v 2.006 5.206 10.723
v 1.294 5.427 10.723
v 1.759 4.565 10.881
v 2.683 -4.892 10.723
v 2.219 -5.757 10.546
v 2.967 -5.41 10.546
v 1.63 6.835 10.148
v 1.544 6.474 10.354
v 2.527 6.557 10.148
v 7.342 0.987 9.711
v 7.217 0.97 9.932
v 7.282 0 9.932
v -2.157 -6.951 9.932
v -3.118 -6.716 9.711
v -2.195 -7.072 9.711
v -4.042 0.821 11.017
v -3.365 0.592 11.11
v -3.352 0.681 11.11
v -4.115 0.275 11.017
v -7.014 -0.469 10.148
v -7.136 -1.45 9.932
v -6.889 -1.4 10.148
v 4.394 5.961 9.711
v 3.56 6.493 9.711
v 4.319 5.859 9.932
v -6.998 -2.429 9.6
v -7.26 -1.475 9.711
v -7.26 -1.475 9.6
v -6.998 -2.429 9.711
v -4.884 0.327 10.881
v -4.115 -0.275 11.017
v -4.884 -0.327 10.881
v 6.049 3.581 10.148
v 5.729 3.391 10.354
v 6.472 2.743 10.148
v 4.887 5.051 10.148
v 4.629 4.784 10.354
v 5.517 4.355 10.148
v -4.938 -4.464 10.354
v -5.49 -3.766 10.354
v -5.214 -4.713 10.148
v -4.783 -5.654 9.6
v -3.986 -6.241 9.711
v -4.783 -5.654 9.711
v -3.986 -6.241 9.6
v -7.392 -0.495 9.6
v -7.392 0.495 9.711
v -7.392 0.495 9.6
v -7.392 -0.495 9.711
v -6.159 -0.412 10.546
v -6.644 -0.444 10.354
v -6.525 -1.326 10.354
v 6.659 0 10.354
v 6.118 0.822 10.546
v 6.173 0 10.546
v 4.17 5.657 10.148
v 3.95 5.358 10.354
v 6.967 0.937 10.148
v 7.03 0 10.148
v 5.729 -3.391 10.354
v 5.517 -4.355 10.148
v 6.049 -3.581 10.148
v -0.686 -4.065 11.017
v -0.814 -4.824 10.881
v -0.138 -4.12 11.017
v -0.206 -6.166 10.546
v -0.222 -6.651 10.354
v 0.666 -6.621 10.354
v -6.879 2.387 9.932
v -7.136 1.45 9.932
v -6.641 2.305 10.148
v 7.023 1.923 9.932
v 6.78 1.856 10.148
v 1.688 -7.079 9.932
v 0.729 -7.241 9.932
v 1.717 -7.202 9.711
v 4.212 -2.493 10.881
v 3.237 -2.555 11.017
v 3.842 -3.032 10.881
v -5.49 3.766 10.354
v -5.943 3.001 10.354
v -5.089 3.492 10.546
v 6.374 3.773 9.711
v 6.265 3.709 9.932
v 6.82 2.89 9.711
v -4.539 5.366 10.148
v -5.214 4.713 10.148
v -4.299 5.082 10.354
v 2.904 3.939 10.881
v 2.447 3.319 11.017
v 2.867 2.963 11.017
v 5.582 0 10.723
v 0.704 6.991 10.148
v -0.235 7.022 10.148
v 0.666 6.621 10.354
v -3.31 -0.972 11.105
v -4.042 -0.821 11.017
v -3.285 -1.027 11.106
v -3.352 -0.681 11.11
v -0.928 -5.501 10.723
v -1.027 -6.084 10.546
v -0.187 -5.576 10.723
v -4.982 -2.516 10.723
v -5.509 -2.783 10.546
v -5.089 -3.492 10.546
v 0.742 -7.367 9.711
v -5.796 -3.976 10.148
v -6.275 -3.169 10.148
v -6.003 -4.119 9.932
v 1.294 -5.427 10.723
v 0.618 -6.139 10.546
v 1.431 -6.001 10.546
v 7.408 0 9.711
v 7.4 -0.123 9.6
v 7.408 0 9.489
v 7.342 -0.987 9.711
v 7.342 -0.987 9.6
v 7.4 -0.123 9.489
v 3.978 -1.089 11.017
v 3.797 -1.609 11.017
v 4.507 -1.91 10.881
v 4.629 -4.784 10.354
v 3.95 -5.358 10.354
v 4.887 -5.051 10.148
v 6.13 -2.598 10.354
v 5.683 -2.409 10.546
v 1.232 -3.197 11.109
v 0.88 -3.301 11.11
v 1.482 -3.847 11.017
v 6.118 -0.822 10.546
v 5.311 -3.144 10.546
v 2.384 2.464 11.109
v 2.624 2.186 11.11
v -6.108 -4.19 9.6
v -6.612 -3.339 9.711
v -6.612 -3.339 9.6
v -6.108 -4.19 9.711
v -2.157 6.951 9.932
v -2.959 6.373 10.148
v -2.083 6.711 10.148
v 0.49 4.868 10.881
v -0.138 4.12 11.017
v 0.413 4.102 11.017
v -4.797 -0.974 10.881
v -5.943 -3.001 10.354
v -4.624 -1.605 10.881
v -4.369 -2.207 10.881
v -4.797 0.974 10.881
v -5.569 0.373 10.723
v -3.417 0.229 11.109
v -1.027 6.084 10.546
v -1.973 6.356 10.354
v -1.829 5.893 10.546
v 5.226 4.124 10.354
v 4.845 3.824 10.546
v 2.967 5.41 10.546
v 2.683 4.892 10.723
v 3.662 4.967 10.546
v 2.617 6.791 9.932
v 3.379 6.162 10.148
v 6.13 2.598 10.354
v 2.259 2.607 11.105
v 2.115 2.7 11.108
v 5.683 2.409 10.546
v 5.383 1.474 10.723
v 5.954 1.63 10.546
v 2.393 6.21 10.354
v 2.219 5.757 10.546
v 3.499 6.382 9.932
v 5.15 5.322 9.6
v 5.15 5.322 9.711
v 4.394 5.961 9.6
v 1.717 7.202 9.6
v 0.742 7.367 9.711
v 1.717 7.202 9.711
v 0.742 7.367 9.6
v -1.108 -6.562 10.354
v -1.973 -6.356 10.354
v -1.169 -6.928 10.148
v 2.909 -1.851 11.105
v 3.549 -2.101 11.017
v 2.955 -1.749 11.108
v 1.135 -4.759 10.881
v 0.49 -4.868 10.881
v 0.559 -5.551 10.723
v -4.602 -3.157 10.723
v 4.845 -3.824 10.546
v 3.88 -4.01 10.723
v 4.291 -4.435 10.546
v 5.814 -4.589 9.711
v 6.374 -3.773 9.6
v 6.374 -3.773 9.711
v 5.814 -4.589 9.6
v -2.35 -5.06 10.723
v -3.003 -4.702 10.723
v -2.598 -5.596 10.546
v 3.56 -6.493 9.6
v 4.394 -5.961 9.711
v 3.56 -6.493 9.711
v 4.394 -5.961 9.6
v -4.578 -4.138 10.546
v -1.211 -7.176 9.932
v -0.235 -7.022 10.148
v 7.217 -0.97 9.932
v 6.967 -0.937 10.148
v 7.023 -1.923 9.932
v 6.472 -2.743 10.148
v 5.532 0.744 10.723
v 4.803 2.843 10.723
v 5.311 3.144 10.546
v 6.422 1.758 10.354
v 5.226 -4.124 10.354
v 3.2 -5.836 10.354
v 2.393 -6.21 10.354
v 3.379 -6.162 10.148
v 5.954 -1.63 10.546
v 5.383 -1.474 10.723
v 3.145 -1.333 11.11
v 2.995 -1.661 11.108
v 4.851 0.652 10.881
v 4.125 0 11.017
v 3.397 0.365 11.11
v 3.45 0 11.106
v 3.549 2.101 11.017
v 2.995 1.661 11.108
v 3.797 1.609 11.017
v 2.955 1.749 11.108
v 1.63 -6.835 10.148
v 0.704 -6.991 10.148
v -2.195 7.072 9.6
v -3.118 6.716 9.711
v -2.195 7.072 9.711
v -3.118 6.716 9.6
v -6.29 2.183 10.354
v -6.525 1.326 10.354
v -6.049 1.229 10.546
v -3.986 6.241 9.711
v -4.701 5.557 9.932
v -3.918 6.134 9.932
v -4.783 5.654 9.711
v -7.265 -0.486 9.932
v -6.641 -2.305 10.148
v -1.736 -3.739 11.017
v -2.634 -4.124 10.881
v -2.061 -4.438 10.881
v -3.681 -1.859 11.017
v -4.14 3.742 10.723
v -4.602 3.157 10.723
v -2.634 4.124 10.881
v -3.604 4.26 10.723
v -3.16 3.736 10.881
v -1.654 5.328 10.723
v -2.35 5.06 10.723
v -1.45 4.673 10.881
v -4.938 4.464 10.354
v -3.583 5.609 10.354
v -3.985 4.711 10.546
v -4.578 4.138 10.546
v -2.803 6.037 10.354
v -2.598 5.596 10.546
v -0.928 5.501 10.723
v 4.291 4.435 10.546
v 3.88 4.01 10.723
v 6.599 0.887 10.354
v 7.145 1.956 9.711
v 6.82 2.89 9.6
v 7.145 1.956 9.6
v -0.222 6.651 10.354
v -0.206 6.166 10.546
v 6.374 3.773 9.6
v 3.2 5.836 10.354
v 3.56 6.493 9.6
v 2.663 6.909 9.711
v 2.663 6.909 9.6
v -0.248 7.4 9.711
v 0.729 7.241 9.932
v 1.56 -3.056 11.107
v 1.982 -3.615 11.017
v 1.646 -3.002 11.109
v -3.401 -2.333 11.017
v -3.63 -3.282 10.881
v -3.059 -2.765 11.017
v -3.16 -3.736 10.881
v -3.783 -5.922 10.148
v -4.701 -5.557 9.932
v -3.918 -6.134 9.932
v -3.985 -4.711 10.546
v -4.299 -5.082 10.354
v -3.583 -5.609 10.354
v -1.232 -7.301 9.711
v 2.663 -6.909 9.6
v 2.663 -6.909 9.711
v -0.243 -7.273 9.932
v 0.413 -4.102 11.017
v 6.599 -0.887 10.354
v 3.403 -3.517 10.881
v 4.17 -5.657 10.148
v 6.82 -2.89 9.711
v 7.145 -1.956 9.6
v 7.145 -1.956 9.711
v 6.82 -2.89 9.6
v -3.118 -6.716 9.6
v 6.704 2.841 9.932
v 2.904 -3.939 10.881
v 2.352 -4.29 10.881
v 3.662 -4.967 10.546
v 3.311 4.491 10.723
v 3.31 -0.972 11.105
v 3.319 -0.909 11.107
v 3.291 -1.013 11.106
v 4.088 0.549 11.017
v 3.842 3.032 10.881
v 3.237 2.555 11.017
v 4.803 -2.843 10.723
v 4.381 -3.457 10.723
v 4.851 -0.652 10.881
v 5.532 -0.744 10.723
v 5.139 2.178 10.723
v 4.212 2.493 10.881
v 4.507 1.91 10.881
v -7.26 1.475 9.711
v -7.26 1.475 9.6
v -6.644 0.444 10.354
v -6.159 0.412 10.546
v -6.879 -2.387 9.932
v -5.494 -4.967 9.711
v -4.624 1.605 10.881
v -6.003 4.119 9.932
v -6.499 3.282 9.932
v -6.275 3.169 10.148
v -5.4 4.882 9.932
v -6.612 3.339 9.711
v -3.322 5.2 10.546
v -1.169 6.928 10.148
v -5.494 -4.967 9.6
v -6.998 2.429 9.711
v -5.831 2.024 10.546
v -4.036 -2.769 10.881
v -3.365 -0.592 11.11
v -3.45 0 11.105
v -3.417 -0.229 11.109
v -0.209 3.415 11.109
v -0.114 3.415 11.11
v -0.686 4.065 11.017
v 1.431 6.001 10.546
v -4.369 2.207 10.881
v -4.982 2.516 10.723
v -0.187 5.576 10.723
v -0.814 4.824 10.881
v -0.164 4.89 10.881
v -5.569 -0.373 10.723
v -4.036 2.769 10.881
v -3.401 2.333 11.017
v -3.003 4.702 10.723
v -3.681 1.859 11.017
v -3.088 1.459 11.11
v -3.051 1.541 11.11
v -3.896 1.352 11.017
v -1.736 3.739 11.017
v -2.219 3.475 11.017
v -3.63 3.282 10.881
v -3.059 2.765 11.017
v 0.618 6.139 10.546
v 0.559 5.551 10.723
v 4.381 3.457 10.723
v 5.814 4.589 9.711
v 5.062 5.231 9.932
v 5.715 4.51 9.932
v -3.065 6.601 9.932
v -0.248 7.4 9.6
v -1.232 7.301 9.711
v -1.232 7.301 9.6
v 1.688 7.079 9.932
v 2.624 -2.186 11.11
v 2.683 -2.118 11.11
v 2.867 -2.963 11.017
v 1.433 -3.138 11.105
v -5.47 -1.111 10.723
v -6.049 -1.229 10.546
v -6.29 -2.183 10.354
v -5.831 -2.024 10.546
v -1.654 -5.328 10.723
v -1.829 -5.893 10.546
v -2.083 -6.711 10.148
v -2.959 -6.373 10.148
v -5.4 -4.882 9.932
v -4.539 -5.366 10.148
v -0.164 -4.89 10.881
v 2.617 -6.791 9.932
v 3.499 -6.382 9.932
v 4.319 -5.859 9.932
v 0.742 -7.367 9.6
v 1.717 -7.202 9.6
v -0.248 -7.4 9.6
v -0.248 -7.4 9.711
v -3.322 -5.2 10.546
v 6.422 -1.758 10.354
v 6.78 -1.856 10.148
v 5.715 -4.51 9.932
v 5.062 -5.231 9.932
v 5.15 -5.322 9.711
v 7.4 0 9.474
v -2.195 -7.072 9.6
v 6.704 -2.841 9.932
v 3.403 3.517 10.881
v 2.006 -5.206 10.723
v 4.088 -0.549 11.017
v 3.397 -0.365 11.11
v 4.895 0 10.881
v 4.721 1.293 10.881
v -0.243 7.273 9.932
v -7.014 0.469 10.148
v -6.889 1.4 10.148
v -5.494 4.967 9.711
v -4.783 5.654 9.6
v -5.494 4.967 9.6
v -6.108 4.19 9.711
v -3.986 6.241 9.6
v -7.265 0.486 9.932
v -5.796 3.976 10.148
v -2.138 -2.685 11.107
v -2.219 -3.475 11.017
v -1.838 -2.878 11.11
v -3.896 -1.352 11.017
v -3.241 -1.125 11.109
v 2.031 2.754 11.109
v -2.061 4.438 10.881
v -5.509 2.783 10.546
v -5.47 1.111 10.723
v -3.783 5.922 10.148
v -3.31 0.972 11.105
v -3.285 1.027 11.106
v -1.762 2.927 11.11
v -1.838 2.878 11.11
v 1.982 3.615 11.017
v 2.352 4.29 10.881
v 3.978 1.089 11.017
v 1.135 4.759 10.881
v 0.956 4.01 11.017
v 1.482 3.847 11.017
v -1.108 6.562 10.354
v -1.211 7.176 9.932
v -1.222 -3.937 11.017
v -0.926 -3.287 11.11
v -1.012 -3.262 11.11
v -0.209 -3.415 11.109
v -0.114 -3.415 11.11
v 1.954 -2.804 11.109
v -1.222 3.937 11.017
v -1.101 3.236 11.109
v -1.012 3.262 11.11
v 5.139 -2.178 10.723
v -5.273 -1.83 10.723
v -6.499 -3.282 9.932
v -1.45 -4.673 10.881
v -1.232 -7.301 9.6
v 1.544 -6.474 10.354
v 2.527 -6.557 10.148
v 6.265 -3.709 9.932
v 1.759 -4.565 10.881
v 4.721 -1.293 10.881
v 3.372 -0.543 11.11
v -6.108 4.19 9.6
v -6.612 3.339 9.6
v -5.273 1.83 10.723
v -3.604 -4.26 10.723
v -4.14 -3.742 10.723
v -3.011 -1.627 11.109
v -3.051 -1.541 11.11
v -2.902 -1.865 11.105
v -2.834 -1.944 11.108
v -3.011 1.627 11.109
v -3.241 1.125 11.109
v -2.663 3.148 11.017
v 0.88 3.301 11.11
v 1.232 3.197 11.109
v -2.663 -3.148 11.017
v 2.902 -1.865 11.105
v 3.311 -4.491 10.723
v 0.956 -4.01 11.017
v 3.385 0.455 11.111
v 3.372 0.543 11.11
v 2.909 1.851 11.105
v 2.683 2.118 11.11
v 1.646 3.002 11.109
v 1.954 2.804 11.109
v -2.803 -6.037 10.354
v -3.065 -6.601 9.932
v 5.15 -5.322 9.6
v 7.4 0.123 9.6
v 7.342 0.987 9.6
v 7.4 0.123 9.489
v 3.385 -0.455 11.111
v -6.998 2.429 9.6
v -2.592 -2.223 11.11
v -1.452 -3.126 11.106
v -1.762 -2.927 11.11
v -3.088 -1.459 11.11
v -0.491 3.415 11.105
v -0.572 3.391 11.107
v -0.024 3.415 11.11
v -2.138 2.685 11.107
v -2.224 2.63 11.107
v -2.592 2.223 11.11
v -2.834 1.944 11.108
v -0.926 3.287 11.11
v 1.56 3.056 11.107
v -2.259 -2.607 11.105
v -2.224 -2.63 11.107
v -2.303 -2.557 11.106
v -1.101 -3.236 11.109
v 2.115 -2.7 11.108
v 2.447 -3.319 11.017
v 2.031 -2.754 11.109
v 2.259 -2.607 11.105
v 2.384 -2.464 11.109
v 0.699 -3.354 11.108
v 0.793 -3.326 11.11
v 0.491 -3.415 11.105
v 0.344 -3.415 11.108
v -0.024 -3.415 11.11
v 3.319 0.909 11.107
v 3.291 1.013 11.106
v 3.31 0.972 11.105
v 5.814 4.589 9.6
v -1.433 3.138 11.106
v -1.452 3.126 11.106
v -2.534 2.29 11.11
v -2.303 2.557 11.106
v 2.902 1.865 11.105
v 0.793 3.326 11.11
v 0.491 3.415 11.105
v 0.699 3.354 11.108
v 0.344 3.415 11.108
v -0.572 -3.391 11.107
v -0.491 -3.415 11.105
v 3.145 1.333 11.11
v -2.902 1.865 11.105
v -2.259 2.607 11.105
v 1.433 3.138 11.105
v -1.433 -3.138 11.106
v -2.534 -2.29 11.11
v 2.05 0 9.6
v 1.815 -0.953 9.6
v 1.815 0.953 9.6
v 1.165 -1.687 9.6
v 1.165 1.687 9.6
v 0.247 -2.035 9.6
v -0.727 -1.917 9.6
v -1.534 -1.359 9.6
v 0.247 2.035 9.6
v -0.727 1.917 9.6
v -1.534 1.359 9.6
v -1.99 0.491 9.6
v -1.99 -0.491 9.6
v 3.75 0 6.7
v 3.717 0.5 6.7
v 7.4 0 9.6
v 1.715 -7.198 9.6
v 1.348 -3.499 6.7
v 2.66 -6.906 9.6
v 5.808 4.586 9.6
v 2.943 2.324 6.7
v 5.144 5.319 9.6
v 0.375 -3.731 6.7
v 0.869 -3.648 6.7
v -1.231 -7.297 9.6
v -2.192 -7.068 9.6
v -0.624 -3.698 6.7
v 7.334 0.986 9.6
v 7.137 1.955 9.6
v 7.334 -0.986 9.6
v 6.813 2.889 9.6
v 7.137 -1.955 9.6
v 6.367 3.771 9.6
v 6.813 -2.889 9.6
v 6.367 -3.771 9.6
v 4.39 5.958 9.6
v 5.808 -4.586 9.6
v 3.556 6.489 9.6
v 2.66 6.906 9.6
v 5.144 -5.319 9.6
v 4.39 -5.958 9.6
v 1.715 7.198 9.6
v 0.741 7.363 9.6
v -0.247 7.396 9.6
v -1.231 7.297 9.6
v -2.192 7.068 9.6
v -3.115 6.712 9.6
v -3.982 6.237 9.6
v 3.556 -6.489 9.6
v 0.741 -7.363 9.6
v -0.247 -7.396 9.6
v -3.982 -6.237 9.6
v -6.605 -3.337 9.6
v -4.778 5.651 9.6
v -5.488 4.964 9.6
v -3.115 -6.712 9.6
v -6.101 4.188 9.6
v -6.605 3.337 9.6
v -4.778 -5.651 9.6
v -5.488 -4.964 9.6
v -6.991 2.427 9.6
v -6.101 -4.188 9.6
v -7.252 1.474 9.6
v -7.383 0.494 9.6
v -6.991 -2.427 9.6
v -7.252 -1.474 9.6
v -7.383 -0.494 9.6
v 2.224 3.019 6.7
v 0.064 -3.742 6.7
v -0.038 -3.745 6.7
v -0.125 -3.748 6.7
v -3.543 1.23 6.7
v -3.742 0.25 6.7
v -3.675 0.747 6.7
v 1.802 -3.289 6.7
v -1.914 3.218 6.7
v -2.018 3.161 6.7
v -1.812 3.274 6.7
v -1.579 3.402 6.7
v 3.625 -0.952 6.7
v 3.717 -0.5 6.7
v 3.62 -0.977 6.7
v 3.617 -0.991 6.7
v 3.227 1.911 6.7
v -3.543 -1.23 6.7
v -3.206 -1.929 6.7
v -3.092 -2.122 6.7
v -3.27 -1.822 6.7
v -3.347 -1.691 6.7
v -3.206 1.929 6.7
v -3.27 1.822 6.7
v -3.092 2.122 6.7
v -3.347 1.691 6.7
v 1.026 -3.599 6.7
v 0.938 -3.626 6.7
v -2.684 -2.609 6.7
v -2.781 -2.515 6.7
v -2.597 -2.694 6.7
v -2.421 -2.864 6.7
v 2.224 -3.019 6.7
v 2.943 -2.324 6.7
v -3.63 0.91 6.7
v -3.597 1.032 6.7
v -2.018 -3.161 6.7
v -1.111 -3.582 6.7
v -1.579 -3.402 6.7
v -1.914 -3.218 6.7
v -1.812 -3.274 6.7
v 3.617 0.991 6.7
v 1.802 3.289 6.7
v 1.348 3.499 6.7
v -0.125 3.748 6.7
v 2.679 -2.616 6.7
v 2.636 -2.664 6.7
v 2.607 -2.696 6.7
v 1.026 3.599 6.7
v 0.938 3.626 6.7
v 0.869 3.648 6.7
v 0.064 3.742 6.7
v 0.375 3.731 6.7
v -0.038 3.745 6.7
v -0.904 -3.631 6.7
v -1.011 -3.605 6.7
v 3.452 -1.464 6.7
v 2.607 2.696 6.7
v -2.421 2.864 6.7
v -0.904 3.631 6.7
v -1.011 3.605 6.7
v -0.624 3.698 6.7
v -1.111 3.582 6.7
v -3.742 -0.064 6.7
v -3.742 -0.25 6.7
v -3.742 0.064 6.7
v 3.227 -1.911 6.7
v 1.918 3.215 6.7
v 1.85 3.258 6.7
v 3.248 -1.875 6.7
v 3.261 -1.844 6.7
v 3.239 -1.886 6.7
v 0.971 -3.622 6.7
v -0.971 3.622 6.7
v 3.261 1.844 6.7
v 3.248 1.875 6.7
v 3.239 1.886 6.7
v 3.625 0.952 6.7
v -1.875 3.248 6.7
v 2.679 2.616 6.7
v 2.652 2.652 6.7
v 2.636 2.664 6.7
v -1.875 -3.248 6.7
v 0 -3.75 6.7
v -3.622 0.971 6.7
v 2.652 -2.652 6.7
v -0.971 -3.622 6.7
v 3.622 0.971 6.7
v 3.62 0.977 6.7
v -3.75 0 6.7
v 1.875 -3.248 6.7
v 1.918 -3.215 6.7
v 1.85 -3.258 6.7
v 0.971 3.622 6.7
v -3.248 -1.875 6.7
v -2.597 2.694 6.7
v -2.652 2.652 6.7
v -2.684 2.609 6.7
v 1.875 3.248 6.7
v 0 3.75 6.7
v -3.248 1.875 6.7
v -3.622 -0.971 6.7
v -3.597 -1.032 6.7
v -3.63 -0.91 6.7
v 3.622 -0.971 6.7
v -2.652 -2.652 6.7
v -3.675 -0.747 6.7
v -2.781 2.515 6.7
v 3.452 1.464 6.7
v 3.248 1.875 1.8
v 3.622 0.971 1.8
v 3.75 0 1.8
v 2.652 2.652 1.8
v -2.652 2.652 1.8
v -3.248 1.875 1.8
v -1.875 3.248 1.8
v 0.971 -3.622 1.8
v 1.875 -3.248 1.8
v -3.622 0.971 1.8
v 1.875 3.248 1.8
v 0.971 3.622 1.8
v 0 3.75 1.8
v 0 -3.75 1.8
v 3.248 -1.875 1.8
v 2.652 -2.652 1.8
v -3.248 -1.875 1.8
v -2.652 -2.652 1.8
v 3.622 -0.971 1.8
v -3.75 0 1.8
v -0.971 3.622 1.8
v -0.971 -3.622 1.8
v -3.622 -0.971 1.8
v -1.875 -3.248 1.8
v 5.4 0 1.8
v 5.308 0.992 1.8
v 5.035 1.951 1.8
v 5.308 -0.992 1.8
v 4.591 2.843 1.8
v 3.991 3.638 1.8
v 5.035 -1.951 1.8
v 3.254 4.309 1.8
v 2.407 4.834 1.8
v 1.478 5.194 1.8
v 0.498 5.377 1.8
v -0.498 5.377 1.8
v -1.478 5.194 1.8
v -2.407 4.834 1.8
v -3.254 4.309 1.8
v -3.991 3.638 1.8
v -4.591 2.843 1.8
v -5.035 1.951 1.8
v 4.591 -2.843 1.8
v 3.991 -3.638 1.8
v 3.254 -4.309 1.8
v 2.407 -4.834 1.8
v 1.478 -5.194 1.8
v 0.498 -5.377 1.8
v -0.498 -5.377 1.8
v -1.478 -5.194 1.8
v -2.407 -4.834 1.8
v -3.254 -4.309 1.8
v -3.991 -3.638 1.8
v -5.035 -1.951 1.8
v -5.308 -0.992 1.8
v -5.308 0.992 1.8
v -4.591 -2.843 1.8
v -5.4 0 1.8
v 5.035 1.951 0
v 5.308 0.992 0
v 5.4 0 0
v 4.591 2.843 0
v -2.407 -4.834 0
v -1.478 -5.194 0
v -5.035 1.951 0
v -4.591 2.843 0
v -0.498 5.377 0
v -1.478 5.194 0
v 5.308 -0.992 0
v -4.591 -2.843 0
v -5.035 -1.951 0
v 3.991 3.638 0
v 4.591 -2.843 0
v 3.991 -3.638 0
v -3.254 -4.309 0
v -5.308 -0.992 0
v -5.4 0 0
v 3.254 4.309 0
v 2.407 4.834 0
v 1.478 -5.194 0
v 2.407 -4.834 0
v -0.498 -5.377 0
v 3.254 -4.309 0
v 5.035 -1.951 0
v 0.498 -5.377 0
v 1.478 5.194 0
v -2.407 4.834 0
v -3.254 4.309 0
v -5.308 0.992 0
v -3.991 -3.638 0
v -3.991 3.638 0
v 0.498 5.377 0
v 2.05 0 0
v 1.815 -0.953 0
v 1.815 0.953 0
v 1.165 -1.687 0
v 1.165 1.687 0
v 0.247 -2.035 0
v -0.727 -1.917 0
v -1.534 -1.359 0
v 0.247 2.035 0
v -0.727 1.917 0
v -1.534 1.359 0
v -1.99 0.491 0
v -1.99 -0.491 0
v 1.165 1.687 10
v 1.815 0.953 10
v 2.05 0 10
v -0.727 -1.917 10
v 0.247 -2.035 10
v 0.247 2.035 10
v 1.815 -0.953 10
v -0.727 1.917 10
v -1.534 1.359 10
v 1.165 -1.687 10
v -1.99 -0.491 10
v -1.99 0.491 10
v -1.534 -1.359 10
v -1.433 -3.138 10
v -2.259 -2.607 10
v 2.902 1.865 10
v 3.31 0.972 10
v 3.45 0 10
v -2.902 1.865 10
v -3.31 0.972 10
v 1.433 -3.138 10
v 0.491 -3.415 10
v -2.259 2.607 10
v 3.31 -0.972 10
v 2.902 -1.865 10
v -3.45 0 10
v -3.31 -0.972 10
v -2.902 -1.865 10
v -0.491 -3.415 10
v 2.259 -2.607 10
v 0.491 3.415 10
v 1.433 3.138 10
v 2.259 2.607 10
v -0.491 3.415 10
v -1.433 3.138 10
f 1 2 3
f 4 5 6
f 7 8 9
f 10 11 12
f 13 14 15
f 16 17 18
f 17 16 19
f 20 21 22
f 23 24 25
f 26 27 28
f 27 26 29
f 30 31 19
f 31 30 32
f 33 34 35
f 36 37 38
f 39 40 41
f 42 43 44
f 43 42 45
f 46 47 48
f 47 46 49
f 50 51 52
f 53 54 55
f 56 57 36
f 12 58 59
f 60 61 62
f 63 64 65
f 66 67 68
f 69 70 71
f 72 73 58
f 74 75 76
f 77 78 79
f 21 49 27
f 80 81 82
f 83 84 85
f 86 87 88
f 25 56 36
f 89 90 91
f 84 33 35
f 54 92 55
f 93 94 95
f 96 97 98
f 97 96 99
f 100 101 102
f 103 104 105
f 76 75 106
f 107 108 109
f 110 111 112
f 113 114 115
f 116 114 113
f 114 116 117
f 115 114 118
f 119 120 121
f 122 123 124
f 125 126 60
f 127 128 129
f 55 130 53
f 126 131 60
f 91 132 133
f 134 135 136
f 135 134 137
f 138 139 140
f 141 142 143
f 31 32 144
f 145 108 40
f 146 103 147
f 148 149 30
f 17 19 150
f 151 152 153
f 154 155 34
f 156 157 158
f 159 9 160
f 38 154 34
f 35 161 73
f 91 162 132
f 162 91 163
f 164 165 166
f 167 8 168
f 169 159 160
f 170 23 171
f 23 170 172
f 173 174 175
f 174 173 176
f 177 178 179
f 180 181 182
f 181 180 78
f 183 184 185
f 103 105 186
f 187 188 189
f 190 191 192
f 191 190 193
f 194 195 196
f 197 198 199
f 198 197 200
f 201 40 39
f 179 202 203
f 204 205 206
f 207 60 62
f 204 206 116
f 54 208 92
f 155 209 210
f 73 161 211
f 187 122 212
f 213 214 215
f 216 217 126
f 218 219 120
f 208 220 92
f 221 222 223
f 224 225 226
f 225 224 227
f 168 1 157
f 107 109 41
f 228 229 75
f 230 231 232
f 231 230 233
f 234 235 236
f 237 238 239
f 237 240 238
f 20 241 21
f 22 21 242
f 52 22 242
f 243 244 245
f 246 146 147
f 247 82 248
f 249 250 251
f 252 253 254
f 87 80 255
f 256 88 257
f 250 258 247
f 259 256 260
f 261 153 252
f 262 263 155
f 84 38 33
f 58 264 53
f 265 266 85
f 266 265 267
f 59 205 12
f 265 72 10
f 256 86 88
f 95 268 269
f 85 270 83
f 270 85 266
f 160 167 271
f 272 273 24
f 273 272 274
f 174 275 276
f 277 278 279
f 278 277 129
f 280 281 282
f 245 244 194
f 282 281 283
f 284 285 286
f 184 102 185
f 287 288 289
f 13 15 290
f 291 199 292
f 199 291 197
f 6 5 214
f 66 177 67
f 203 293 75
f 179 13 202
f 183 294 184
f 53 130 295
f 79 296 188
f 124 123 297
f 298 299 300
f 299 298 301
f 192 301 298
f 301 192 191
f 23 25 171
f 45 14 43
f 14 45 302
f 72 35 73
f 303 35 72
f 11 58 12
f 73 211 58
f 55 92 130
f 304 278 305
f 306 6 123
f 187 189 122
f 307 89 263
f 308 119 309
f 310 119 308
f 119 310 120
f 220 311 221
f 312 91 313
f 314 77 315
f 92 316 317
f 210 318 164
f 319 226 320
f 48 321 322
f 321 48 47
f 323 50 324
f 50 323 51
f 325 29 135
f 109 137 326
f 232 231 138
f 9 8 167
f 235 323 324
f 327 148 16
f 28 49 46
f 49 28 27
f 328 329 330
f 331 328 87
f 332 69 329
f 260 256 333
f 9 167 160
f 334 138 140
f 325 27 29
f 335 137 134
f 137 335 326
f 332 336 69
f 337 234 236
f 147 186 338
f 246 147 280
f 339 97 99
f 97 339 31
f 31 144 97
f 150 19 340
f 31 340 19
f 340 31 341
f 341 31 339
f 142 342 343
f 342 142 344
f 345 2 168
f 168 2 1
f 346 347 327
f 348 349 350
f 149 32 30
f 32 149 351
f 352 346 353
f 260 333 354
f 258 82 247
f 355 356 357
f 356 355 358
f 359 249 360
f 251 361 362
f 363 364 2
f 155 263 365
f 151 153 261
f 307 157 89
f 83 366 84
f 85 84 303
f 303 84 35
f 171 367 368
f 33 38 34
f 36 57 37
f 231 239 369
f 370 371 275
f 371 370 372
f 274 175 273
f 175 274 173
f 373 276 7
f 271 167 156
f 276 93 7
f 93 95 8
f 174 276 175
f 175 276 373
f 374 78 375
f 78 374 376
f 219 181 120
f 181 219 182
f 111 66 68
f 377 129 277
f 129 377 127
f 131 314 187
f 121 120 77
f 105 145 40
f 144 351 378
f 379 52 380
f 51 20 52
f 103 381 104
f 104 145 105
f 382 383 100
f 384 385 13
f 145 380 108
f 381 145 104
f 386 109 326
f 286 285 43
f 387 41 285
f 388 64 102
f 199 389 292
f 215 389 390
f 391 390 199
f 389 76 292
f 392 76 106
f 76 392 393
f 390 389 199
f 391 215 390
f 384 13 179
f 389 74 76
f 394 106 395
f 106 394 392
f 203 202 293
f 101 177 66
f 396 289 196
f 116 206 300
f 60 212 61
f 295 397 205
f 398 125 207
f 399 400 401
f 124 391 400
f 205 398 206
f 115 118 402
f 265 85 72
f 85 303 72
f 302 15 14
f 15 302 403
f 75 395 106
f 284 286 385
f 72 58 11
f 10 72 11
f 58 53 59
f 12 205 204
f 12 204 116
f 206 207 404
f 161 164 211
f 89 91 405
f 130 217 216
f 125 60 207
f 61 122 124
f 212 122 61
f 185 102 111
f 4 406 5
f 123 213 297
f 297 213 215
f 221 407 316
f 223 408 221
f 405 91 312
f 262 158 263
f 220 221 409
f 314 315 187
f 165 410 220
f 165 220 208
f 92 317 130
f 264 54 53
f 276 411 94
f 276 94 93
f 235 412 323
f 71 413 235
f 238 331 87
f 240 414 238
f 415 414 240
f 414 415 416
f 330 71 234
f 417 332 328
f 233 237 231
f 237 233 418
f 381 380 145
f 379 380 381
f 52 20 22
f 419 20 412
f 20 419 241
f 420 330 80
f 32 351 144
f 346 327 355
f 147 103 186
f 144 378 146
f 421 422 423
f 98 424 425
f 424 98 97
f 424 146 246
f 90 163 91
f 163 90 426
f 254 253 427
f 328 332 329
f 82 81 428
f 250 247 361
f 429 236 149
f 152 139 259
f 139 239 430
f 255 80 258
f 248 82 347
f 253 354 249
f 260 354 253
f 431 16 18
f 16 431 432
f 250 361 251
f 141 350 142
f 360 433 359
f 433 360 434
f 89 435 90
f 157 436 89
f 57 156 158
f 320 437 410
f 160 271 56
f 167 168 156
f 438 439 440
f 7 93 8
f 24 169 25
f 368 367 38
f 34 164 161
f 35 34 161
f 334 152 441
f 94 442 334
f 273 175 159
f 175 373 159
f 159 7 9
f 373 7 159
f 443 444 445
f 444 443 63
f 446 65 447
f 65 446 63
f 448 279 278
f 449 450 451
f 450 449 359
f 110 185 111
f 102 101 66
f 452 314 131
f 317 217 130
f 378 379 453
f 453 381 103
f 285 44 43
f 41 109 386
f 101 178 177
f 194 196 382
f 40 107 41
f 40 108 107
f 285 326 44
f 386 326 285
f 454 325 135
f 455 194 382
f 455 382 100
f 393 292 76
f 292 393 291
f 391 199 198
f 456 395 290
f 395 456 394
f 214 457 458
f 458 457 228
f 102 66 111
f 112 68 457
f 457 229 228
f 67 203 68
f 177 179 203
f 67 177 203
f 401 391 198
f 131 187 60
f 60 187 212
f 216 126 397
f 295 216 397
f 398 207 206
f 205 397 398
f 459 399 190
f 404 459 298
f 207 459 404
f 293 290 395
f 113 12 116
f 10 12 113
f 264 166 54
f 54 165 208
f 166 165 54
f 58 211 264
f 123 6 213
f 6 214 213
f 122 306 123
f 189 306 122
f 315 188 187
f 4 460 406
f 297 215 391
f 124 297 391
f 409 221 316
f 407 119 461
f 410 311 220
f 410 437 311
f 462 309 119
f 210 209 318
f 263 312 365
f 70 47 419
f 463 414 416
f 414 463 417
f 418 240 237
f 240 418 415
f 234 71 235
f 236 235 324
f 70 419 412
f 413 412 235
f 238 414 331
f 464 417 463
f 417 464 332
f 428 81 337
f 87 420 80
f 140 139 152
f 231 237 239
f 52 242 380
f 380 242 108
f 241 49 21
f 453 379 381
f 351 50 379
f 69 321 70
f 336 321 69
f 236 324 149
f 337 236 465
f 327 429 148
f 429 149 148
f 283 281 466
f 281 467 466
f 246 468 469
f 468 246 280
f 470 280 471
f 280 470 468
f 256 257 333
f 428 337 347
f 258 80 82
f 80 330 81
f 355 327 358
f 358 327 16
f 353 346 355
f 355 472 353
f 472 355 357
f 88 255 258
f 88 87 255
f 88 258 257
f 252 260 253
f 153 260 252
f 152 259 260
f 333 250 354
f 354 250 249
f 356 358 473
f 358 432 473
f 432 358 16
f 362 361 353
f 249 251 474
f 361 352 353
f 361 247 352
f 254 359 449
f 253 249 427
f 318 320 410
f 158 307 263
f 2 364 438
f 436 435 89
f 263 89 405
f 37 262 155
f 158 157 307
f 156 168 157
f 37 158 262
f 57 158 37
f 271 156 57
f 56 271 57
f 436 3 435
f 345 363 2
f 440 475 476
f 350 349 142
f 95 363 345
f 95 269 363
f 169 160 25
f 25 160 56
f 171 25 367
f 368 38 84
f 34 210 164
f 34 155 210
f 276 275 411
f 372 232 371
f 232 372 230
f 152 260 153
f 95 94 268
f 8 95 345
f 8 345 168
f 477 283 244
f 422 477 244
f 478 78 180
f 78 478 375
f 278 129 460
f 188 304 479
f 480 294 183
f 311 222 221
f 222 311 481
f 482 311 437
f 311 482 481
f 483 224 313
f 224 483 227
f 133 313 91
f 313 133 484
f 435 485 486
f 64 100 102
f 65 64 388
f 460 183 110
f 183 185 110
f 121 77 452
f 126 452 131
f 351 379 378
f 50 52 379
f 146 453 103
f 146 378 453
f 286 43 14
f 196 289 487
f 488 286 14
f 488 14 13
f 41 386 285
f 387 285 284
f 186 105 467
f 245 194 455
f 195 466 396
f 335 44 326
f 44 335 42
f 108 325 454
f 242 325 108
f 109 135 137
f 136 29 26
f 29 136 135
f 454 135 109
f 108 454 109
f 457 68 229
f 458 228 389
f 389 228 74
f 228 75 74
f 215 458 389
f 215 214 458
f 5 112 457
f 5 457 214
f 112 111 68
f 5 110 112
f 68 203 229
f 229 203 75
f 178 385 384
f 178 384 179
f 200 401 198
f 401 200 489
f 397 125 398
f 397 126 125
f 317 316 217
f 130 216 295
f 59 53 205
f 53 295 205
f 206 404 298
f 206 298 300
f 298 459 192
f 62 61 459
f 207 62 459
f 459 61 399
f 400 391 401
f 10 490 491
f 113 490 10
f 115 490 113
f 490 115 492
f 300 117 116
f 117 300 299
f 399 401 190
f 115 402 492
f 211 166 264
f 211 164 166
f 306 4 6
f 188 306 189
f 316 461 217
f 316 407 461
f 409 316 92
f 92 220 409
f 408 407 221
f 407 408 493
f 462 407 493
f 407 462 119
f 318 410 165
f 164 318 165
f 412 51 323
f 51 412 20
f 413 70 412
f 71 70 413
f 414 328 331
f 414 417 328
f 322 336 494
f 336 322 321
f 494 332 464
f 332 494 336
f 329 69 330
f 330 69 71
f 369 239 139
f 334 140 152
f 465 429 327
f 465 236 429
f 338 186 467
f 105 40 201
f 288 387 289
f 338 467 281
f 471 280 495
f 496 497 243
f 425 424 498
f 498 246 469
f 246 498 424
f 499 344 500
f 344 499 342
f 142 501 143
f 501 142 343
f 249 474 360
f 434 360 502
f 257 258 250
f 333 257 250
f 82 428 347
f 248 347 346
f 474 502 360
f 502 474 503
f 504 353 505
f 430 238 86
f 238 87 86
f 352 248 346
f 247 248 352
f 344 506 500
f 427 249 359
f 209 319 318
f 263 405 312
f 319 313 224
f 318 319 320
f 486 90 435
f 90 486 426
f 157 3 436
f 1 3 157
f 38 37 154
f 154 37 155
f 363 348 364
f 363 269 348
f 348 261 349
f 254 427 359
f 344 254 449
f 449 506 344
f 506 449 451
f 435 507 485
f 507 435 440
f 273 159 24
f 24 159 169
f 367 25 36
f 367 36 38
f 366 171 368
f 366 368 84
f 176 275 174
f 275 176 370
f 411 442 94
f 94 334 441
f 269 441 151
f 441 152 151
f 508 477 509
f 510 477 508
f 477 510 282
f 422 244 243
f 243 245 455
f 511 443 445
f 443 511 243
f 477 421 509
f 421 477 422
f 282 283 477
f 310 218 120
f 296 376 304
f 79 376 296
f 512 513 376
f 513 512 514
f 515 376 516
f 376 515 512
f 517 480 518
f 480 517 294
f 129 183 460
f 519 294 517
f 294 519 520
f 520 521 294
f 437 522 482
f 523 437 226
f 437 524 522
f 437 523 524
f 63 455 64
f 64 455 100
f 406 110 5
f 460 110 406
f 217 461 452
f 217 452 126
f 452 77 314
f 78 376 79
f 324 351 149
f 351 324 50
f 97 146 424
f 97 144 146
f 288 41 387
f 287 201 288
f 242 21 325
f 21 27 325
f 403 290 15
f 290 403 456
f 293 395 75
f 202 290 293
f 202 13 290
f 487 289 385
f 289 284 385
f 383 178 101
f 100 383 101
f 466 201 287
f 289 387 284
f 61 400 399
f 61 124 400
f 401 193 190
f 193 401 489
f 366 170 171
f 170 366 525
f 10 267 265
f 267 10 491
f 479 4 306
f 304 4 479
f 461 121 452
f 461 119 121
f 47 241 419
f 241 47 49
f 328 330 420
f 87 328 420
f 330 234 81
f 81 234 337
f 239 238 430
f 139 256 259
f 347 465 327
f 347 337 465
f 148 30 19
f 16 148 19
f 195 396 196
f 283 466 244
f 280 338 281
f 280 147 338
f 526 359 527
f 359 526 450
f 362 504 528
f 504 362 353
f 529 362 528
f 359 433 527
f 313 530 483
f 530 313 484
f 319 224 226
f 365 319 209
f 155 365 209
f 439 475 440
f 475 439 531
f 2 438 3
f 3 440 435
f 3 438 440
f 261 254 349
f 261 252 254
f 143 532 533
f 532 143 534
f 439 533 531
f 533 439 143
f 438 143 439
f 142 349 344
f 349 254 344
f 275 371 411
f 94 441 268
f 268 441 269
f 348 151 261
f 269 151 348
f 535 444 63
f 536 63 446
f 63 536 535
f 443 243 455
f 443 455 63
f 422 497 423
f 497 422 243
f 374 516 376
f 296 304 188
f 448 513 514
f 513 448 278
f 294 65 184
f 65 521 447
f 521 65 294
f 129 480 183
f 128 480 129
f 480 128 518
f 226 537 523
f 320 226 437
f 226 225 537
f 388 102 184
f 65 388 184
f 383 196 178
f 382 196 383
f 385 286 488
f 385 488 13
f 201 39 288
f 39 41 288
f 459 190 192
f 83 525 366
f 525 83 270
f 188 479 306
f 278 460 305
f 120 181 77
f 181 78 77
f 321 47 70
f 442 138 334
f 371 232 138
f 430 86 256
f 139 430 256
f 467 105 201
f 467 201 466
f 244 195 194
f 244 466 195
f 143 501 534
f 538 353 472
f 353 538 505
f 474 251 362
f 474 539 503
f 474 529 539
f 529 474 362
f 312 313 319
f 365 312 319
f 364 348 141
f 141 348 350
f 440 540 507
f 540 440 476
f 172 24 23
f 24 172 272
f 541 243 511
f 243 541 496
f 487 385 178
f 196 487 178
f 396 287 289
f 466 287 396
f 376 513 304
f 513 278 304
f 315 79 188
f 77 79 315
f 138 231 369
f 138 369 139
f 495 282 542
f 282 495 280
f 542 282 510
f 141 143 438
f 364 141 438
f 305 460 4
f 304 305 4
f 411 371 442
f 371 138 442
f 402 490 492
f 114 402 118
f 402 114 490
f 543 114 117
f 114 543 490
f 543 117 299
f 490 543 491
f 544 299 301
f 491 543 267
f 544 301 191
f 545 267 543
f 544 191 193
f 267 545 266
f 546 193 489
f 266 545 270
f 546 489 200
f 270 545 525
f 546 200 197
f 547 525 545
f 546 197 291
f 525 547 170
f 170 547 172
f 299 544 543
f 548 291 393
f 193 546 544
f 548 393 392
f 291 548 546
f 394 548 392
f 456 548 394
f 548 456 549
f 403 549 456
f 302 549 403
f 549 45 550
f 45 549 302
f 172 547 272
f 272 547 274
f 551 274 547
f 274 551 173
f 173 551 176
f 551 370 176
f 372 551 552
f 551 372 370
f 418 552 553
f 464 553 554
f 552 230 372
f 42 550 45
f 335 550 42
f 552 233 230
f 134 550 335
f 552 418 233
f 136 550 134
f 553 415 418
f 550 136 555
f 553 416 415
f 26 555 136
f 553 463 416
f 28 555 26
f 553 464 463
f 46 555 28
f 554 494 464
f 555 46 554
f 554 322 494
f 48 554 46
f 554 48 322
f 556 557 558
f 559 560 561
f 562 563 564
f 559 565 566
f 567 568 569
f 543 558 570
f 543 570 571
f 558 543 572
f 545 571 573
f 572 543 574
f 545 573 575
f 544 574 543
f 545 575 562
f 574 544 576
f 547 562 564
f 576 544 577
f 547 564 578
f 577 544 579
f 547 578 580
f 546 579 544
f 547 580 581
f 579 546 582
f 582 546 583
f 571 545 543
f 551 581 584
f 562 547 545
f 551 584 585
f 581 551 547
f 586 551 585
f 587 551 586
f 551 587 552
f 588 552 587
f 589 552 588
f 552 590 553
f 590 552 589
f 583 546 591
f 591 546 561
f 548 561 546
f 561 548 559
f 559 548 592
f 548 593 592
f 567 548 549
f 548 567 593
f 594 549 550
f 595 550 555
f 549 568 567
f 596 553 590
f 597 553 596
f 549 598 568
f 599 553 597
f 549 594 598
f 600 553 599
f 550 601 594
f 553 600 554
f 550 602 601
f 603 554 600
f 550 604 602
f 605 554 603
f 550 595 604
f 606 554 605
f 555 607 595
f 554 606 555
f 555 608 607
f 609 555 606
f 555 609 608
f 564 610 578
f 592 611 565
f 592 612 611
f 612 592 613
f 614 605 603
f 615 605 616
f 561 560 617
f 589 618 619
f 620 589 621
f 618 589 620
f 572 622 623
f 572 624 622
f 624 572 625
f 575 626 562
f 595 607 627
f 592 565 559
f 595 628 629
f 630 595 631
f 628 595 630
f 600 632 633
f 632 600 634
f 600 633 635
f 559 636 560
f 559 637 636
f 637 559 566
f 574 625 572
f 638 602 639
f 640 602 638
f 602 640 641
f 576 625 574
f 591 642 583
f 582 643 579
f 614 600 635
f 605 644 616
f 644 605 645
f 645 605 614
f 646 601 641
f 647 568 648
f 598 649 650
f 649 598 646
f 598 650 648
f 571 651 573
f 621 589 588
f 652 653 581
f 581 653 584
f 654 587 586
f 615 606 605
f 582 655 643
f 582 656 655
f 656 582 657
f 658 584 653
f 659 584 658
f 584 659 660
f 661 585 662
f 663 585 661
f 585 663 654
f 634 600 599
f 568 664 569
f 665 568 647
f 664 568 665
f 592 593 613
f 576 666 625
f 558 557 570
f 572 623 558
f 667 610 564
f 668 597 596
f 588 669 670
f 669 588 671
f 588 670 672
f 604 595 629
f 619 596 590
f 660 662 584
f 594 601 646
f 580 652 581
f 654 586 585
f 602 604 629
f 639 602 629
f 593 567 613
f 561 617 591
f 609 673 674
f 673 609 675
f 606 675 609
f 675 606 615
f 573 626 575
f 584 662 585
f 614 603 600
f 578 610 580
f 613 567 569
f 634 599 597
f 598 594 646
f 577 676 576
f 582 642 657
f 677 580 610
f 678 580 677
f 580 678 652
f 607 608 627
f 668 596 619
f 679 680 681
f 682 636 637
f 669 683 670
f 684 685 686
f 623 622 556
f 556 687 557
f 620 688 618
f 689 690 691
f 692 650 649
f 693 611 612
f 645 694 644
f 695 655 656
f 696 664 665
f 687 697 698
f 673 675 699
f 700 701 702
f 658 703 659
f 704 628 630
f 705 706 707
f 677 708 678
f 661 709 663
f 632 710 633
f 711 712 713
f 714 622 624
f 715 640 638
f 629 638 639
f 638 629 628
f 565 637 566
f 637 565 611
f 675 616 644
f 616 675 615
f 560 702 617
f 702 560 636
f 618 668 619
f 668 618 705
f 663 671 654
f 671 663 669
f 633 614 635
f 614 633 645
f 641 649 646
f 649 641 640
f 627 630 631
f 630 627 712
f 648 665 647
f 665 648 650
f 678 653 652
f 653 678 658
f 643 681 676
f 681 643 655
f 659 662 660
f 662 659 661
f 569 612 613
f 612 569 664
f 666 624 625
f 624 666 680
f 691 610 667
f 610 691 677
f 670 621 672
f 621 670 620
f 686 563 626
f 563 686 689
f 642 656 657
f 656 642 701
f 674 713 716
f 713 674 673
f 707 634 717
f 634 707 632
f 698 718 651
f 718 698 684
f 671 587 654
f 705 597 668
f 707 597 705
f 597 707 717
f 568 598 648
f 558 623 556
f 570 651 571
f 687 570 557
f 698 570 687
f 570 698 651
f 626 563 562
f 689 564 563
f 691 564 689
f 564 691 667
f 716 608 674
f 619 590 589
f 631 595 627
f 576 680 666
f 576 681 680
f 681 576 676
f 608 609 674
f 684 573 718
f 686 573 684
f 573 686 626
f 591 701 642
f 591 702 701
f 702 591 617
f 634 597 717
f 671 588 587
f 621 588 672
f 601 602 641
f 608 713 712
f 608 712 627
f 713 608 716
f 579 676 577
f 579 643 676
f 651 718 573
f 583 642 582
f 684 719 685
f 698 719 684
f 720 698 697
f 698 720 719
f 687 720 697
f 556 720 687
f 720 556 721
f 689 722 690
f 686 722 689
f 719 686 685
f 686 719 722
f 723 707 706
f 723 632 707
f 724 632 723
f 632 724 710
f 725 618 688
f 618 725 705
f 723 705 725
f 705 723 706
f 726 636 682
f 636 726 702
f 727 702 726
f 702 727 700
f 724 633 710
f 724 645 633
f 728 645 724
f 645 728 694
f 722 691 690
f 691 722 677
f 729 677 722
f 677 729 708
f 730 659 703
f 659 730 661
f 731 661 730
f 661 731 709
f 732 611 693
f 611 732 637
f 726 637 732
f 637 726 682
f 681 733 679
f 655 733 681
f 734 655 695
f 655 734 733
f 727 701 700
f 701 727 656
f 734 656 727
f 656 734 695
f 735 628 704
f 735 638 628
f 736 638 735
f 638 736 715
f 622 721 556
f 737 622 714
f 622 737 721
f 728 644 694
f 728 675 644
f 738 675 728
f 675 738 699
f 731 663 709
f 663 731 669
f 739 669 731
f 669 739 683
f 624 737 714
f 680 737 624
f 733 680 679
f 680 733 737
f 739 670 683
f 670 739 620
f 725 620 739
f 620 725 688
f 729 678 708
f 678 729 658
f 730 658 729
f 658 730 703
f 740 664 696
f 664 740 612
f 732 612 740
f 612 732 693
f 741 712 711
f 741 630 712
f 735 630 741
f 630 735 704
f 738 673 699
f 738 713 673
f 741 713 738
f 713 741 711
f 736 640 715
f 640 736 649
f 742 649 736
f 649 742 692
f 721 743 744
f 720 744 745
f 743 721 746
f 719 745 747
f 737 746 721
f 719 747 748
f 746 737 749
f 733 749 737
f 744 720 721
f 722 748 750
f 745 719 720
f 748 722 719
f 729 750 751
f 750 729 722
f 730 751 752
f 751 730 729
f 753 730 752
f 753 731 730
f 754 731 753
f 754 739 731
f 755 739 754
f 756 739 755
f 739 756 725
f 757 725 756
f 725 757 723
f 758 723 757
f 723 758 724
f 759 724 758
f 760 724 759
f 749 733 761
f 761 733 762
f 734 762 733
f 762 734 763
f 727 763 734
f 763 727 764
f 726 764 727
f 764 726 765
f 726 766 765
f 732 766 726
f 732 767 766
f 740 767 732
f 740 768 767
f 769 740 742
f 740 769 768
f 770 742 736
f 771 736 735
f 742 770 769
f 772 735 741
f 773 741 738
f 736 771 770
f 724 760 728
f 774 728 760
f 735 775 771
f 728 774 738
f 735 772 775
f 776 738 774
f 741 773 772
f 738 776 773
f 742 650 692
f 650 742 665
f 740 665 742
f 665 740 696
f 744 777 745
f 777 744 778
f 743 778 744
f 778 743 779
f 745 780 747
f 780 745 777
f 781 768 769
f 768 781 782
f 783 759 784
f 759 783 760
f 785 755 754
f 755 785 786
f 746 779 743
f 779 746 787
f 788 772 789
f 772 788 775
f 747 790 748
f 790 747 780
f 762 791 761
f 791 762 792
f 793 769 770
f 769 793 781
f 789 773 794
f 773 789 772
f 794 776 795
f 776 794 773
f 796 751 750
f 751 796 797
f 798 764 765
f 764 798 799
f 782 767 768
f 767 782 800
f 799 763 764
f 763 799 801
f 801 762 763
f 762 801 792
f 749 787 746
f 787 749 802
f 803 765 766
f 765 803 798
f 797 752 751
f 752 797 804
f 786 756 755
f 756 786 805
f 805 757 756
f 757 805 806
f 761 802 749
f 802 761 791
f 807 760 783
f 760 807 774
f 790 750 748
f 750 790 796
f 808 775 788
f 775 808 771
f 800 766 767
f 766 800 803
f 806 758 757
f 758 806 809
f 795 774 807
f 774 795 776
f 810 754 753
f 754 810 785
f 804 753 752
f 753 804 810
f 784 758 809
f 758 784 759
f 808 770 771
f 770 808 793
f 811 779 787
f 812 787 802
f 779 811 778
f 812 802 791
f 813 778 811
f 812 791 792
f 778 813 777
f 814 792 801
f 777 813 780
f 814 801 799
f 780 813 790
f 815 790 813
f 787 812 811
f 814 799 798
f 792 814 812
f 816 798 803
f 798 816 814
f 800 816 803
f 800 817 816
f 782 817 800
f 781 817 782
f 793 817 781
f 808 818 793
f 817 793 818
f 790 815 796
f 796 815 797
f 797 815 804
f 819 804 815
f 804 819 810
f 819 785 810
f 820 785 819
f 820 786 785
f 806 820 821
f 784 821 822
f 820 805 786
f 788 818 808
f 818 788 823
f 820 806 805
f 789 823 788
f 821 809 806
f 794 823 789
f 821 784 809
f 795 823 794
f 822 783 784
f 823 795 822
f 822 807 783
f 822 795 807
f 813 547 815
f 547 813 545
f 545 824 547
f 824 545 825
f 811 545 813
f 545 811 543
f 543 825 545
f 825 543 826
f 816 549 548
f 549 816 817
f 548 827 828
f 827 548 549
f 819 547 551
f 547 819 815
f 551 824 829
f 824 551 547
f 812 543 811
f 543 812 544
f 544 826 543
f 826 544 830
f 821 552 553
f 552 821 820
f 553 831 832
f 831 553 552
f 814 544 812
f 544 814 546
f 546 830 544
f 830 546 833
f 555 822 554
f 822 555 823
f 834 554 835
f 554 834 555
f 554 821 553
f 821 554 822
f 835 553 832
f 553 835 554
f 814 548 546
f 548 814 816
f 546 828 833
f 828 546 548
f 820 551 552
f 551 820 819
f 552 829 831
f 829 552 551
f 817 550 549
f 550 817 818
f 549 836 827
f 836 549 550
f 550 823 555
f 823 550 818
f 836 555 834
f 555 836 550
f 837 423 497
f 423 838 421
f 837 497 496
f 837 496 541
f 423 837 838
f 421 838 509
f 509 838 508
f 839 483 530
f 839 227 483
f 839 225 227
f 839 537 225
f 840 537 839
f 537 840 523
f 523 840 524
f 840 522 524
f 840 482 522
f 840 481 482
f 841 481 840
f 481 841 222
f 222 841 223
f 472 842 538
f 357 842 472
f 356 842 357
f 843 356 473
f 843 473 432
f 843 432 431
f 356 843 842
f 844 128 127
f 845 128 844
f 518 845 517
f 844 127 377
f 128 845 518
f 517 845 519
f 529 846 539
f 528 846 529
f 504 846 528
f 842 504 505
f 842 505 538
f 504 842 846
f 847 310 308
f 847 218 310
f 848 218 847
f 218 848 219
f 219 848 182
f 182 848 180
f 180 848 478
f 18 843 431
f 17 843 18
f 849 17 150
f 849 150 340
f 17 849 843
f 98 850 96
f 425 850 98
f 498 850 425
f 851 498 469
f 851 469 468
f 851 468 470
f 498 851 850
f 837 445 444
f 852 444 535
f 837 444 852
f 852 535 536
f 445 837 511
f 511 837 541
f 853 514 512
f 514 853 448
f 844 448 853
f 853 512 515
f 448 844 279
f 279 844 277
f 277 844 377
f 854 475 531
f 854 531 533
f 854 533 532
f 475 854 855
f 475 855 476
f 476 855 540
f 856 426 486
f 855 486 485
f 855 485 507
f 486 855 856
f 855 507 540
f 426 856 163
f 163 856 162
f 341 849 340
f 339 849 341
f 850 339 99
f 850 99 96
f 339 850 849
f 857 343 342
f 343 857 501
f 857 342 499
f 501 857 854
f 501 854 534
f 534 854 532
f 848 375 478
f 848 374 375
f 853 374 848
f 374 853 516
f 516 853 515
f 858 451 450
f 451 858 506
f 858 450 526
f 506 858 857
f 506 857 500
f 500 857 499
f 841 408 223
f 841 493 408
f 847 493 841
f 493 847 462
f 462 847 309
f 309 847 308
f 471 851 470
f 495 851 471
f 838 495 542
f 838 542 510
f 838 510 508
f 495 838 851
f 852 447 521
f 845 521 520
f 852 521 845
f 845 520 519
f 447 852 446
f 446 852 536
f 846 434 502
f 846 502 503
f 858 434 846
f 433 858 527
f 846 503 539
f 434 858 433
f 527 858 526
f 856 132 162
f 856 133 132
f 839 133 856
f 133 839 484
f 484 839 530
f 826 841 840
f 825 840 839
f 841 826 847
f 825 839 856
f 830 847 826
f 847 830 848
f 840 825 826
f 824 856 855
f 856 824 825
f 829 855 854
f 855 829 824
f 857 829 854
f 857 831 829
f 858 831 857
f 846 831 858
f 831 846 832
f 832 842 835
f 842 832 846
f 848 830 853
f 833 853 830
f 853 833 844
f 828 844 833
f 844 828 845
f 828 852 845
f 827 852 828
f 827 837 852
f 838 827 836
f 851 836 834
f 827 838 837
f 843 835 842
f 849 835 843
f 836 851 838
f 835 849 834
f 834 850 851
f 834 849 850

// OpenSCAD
/**
 * Strap button for a child's guitar. 13mm tall, ~15mm wide at the widest.
 */

// Button width.
width = 14.8;

// Button height.
height = 13;

// Screw diameter.
screw_diameter = 4.1;

// Countersink diameter.
countersink_diameter = 6.9;

// Countersink depth.
countersink_depth = 3;

module strap_button() {
	current_height = 0;
	
	bottom_ridge_height = (1.8 / width) * width;
	bottom_ridge_diameter = (5.4 / 7.4) * width;
	
	flare_height = (2.9 / 14.8) * width;
	
	top_height = (3.4 / 14.8) * width;

	center_height = height - bottom_ridge_height - flare_height - top_height;//(5.5 / 13) * height;
	center_diameter = (3.75 / 7.4) * width;
	
	$fa = 1;
	$fs = 1;

	difference() {
		union() {
			// Bottom ridge
			translate([0, 0, current_height]) cylinder(r=bottom_ridge_diameter / 2, h=bottom_ridge_height);
		
			assign(current_height = current_height + bottom_ridge_height) {
				// Thin part.
				translate([0, 0, current_height]) cylinder(r=center_diameter / 2, h=center_height);
				assign(current_height = current_height + center_height) {
					translate([0, 0, current_height]) cylinder(r1=center_diameter / 2, r2=width / 2, h=flare_height);
					assign(current_height = current_height + flare_height) {
						translate([0, 0, current_height]) difference() {
							resize([width, width, top_height]) sphere(r=width / 2);
							translate([0, 0, -width / 2]) cube([width, width, width], true);
						};
					};
					
				};
			};
		}

		cylinder(r=screw_diameter / 2, h=height);
		translate([0, 0, height - countersink_depth]) cylinder(r=countersink_diameter / 2, h=countersink_depth);
	};
}

strap_button();
